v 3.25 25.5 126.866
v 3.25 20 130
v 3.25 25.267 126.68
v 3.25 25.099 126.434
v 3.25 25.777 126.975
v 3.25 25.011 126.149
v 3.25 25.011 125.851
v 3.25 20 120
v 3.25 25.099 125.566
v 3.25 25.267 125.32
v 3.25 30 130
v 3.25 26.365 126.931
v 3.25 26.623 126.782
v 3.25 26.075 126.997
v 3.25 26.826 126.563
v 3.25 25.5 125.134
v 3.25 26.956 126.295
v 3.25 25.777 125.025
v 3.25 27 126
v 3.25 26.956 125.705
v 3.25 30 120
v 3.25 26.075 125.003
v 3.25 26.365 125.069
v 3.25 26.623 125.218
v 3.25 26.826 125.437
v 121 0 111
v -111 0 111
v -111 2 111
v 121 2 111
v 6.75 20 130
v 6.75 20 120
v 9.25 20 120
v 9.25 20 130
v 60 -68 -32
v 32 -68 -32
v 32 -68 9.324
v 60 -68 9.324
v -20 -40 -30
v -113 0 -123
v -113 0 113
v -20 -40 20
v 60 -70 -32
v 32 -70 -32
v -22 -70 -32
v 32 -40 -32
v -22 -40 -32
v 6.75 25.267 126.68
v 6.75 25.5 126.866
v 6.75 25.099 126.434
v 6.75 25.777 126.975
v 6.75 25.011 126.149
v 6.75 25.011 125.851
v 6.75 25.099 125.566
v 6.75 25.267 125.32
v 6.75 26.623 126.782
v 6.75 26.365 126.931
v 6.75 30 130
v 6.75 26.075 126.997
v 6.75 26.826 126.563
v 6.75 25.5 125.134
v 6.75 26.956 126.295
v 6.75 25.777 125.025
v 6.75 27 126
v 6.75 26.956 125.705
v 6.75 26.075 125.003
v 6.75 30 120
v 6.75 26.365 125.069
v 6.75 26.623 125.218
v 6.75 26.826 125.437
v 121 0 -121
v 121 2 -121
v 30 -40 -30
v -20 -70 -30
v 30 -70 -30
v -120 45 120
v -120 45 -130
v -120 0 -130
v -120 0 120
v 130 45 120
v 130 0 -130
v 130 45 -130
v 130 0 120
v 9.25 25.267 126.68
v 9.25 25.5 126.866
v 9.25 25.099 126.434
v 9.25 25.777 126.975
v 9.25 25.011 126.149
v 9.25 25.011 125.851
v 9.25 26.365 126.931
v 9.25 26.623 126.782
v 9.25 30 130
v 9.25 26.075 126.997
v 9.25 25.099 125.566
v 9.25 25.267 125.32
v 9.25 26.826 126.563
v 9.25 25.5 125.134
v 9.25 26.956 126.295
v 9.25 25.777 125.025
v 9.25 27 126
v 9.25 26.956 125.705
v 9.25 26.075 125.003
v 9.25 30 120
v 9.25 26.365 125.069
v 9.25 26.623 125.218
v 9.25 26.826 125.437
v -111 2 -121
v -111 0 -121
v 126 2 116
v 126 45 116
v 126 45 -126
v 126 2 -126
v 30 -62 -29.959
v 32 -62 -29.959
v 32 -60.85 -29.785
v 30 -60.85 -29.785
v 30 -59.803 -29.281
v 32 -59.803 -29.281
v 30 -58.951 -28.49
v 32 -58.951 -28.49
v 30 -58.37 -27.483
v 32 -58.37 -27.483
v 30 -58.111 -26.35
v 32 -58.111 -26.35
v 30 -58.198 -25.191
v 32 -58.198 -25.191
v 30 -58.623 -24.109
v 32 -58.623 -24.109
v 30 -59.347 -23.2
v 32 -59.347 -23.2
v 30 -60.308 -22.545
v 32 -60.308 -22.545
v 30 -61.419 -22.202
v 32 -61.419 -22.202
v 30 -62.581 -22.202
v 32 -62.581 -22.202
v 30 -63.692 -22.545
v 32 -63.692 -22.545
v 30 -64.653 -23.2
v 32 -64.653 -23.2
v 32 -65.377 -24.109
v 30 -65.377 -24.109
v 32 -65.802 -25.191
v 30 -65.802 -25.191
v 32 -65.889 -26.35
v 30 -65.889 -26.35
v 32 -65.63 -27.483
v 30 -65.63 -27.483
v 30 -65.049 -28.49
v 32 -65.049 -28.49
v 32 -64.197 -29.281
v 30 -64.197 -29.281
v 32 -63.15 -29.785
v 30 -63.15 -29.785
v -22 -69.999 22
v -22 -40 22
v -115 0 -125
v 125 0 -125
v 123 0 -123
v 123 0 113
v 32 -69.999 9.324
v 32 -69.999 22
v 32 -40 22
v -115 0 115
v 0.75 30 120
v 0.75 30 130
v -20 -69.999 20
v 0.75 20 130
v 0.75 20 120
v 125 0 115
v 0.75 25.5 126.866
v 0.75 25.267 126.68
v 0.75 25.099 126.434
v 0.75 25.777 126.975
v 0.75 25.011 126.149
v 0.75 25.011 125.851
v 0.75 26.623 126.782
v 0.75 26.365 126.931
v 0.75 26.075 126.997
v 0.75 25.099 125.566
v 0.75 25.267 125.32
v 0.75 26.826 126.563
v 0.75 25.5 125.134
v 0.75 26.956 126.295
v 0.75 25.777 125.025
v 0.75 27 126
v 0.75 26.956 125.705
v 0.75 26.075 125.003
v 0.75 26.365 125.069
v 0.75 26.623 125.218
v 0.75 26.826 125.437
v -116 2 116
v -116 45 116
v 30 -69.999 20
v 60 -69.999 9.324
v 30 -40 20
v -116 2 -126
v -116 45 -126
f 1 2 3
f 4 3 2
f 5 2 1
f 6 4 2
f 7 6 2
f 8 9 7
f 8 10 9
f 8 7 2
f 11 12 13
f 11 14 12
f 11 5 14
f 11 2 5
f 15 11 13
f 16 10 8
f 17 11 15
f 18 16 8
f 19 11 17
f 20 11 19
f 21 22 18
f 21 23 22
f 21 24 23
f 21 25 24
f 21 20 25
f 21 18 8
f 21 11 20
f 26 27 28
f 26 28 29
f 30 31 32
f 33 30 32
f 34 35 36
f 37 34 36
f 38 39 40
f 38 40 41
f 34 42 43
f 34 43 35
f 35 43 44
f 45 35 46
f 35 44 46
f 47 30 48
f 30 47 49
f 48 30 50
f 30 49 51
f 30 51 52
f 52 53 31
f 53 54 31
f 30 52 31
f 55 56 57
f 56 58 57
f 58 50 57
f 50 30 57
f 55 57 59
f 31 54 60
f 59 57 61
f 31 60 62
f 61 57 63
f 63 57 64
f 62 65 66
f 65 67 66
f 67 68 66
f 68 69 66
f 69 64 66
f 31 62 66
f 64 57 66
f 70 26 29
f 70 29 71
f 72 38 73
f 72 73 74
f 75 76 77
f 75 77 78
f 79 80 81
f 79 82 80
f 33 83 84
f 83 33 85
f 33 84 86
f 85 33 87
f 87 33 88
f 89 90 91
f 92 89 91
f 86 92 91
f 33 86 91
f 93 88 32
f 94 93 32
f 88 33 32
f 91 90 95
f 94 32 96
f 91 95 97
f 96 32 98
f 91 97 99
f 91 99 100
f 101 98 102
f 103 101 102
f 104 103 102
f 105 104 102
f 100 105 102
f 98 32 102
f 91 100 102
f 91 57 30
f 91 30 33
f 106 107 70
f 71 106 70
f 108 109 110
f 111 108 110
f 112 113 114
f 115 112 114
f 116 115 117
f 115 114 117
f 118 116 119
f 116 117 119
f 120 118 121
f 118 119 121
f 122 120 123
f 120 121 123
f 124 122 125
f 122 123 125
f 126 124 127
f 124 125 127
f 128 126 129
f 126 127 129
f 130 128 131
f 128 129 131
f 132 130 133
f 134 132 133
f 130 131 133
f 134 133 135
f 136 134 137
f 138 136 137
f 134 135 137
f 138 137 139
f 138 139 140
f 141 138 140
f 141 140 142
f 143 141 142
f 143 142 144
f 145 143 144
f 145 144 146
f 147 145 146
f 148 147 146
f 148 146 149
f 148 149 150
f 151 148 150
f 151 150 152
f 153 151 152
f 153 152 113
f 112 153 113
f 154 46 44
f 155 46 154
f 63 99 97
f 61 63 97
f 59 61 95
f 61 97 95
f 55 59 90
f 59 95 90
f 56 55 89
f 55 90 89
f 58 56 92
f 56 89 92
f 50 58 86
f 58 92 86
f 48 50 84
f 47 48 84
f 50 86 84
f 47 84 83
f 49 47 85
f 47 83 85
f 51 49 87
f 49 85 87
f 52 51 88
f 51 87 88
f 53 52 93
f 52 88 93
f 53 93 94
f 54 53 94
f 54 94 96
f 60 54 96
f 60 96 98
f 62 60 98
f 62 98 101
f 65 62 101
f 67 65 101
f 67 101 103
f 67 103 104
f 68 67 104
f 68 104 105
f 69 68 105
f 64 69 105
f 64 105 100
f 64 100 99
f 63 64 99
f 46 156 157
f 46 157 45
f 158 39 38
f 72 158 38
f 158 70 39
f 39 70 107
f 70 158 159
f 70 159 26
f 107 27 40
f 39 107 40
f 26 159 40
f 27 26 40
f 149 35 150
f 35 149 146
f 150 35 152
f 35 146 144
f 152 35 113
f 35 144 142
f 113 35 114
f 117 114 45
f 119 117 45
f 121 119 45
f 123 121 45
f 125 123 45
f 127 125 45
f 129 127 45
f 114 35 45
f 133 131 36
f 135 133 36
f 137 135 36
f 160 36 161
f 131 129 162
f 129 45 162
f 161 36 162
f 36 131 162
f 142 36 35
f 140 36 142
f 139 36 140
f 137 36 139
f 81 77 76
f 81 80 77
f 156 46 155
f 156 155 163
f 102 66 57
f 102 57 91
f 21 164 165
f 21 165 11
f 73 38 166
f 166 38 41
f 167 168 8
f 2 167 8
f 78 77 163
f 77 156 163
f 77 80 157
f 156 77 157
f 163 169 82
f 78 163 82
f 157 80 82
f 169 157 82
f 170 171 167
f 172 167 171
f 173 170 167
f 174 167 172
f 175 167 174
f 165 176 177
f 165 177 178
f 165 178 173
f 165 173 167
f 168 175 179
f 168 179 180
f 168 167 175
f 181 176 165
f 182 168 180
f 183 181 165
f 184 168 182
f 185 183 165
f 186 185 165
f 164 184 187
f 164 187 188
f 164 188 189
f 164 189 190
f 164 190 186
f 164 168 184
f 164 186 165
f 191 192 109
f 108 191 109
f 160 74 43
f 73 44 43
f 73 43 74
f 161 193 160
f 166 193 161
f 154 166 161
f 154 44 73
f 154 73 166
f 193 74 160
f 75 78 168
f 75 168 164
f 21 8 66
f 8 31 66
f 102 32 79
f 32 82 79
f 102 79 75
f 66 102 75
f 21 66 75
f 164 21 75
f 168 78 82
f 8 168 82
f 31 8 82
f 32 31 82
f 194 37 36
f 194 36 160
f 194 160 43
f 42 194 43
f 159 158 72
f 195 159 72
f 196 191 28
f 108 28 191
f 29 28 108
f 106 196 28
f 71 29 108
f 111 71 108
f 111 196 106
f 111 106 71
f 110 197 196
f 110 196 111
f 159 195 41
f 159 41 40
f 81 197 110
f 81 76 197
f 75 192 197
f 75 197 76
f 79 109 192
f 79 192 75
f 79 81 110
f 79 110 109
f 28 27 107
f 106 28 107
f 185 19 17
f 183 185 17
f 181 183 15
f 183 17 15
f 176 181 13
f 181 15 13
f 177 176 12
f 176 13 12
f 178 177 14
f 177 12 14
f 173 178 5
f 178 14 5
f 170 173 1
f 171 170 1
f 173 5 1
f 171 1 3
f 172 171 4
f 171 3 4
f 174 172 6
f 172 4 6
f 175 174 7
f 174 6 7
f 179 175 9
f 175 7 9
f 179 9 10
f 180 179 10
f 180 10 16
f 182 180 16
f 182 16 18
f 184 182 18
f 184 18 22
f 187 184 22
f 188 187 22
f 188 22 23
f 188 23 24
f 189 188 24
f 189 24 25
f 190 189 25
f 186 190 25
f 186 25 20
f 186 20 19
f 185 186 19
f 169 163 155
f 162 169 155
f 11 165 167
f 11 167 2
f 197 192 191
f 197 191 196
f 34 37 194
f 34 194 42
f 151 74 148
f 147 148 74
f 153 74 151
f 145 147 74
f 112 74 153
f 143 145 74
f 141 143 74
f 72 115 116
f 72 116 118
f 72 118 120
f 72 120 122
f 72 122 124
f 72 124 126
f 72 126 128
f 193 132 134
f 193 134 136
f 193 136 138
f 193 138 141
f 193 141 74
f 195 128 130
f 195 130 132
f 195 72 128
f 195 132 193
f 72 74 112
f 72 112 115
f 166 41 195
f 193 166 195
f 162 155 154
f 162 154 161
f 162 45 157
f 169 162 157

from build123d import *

# Parameters (mm, degrees)
CROQUIS2_W               = 240
CROQUIS2_H               = 240
CROQUIS2_W_2             = 232
CROQUIS2_H_2             = 232
SALIENTE_EXTRUIR1_DEPTH  = 45
CROQUIS4_W               = 8.5
CROQUIS4_H               = 10
SALIENTE_EXTRUIR2_DEPTH  = 15
CORTAR_EXTRUIR1_REACH    = 187.373
CROQUIS5_R               = 1
CORTAR_EXTRUIR2_REACH    = 187.876
CROQUIS6_W               = 3.5
CROQUIS6_H               = 10
SALIENTE_EXTRUIR3_DEPTH  = 240
CORTAR_EXTRUIR3_DEPTH    = 250
SALIENTE_EXTRUIR4_DEPTH  = 240
CORTAR_EXTRUIR4_DEPTH    = 250
CROQUIS11_W              = 54
CROQUIS11_H              = 54
CROQUIS11_W_2            = 50
CROQUIS11_H_2            = 50
SALIENTE_EXTRUIR5_DEPTH  = 30
CORTAR_EXTRUIR5_START    = -54
CORTAR_EXTRUIR5_DEPTH    = 54
CROQUIS14_W              = 240
CROQUIS14_H              = 45
SALIENTE_EXTRUIR6_DEPTH  = 5
CROQUIS15_W              = 245
CROQUIS15_H              = 45
SALIENTE_EXTRUIR7_DEPTH  = 5
CROQUIS16_W              = 245
CROQUIS16_H              = 45
SALIENTE_EXTRUIR8_DEPTH  = 5
CROQUIS17_W              = 250
CROQUIS17_H              = 45
SALIENTE_EXTRUIR9_DEPTH  = 5
CROQUIS18_W              = 242
CROQUIS18_H              = 242
CORTAR_EXTRUIR6_DEPTH    = 43
SALIENTE_EXTRUIR10_DEPTH = 28
CORTAR_EXTRUIR7_REACH    = 213.906
CROQUIS20_R              = 3.9


# Read off the part's stored shape, not the designer's step: Cortar-Extruir5
with BuildPart() as part:
    # Croquis2 → Saliente-Extruir1 (new body)
    with BuildSketch(Plane(origin=(0, 0, 0), x_dir=(1, 0, 0), z_dir=(0, 1, 0))):
        with Locations((5, 5)):
            Rectangle(CROQUIS2_W, CROQUIS2_H)
        with Locations((5, 5)):
            Rectangle(CROQUIS2_W_2, CROQUIS2_H_2, mode=Mode.SUBTRACT)
    extrude(amount=SALIENTE_EXTRUIR1_DEPTH)

    # Croquis4 → Saliente-Extruir2 (add)
    with BuildSketch(Plane.XY.offset(115)):
        with Locations((5, 25)):
            Rectangle(CROQUIS4_W, CROQUIS4_H)
    extrude(amount=SALIENTE_EXTRUIR2_DEPTH)

    # Croquis5 → Cortar-Extruir1 (cut, up to next)
    with BuildSketch(Plane(origin=(9.25, 0, 0), x_dir=(0, 0, -1), z_dir=(1, 0, 0)), mode=Mode.PRIVATE) as cortar_extruir1_sk1:
        with Locations(Location((-126, 26, 0), (0, 0, 90))):
            Circle(CROQUIS5_R)
    cortar_extruir1_tool1 = extrude(cortar_extruir1_sk1.sketch, amount=-CORTAR_EXTRUIR1_REACH, mode=Mode.PRIVATE) & part.part
    add(cortar_extruir1_tool1.solids().sort_by_distance((9.25, 26, 126))[0], mode=Mode.SUBTRACT)

    # Croquis6 → Cortar-Extruir2 (cut, up to next)
    with BuildSketch(Plane(origin=(0, 45, 0), x_dir=(1, 0, 0), z_dir=(0, 1, 0)), mode=Mode.PRIVATE) as cortar_extruir2_sk1:
        with Locations((5, -125)):
            Rectangle(CROQUIS6_W, CROQUIS6_H)
    cortar_extruir2_tool1 = extrude(cortar_extruir2_sk1.sketch, amount=-CORTAR_EXTRUIR2_REACH, mode=Mode.PRIVATE) & part.part
    add(cortar_extruir2_tool1.solids().sort_by_distance((5, 45, 125))[0], mode=Mode.SUBTRACT)

    # Croquis7 → Saliente-Extruir3 (add)
    with BuildSketch(Plane.ZY.offset(115)):
        Polygon((113, 0), (115, 0), (22, -40), (20, -40), align=None)
        Polygon((-125, 0), (-123, 0), (-30, -40), (-32, -40), align=None)
    extrude(amount=-SALIENTE_EXTRUIR3_DEPTH)

    # Croquis8 → Cortar-Extruir3 (cut)
    with BuildSketch(Plane.XY.offset(115)):
        Polygon((123, 0), (30, -40), (125, -40), (125, 0), align=None)
        Polygon((-115, -40), (-20, -40), (-113, 0), (-115, 0), align=None)
    extrude(amount=-CORTAR_EXTRUIR3_DEPTH, mode=Mode.SUBTRACT)

    # Croquis9 → Saliente-Extruir4 (add)
    with BuildSketch(Plane(origin=(0, 0, -125), x_dir=(-1, 0, 0), z_dir=(0, 0, -1))):
        Polygon((20, -40), (22, -40), (115, 0), (113, 0), align=None)
        Polygon((-30, -40), (-32, -40), (-125, 0), (-123, 0), align=None)
    extrude(amount=-SALIENTE_EXTRUIR4_DEPTH)

    # Croquis10 → Cortar-Extruir4 (cut)
    with BuildSketch(Plane.ZY.offset(115)):
        Polygon((-125, -40), (-125, 0), (-32, -40), align=None)
        Polygon((22, -40), (115, -40), (115, 0), align=None)
    extrude(amount=-CORTAR_EXTRUIR4_DEPTH, mode=Mode.SUBTRACT)

    # Croquis11 → Saliente-Extruir5 (add)
    with BuildSketch(Plane.XZ.offset(40)):
        with Locations((5, -5)):
            Rectangle(CROQUIS11_W, CROQUIS11_H)
        with Locations((5, -5)):
            Rectangle(CROQUIS11_W_2, CROQUIS11_H_2, mode=Mode.SUBTRACT)
    extrude(amount=SALIENTE_EXTRUIR5_DEPTH)

    # Cortar-Extruir5 outline → Cortar-Extruir5 (cut)
    with BuildSketch(Plane(origin=(32, 0, 0), x_dir=(0, 0, -1), z_dir=(1, 0, 0)).offset(CORTAR_EXTRUIR5_START)):
        Polygon((-22, -70), (32, -70), (-22, -69.999), align=None)
    extrude(amount=CORTAR_EXTRUIR5_DEPTH, mode=Mode.SUBTRACT)

    # Croquis14 → Saliente-Extruir6 (add)
    with BuildSketch(Plane.XY.offset(115)):
        with Locations((5, 22.5)):
            Rectangle(CROQUIS14_W, CROQUIS14_H)
    extrude(amount=SALIENTE_EXTRUIR6_DEPTH)

    # Croquis15 → Saliente-Extruir7 (add)
    with BuildSketch(Plane(origin=(125, 0, 0), x_dir=(0, 0, -1), z_dir=(1, 0, 0))):
        with Locations((2.5, 22.5)):
            Rectangle(CROQUIS15_W, CROQUIS15_H)
    extrude(amount=SALIENTE_EXTRUIR7_DEPTH)

    # Croquis16 → Saliente-Extruir8 (add)
    with BuildSketch(Plane(origin=(0, 0, -125), x_dir=(-1, 0, 0), z_dir=(0, 0, -1))):
        with Locations((-7.5, 22.5)):
            Rectangle(CROQUIS16_W, CROQUIS16_H)
    extrude(amount=SALIENTE_EXTRUIR8_DEPTH)

    # Croquis17 → Saliente-Extruir9 (add)
    with BuildSketch(Plane.ZY.offset(115)):
        with Locations((-5, 22.5)):
            Rectangle(CROQUIS17_W, CROQUIS17_H)
    extrude(amount=SALIENTE_EXTRUIR9_DEPTH)

    # Croquis18 → Cortar-Extruir6 (cut)
    with BuildSketch(Plane(origin=(0, 45, 0), x_dir=(1, 0, 0), z_dir=(0, 1, 0))):
        with Locations((5, 5)):
            Rectangle(CROQUIS18_W, CROQUIS18_H)
    extrude(amount=-CORTAR_EXTRUIR6_DEPTH, mode=Mode.SUBTRACT)

    # Croquis19 → Saliente-Extruir10 (add)
    with BuildSketch(Plane(origin=(32, 0, 0), x_dir=(0, 0, -1), z_dir=(1, 0, 0))):
        Polygon((32, -70), (32, -68), (-9.324230876, -68), (-9.324230876, -69.999234736), align=None)
    extrude(amount=SALIENTE_EXTRUIR10_DEPTH)

    # Croquis20 → Cortar-Extruir7 (cut, up to next)
    with BuildSketch(Plane(origin=(32, 0, 0), x_dir=(0, 0, -1), z_dir=(1, 0, 0)), mode=Mode.PRIVATE) as cortar_extruir7_sk1:
        with Locations((26.058589575, -62)):
            Circle(CROQUIS20_R)
    cortar_extruir7_tool1 = extrude(cortar_extruir7_sk1.sketch, amount=-CORTAR_EXTRUIR7_REACH, mode=Mode.PRIVATE) & part.part
    add(cortar_extruir7_tool1.solids().sort_by_distance((32, -62, -26.05859))[0], mode=Mode.SUBTRACT)


solid = part.part
